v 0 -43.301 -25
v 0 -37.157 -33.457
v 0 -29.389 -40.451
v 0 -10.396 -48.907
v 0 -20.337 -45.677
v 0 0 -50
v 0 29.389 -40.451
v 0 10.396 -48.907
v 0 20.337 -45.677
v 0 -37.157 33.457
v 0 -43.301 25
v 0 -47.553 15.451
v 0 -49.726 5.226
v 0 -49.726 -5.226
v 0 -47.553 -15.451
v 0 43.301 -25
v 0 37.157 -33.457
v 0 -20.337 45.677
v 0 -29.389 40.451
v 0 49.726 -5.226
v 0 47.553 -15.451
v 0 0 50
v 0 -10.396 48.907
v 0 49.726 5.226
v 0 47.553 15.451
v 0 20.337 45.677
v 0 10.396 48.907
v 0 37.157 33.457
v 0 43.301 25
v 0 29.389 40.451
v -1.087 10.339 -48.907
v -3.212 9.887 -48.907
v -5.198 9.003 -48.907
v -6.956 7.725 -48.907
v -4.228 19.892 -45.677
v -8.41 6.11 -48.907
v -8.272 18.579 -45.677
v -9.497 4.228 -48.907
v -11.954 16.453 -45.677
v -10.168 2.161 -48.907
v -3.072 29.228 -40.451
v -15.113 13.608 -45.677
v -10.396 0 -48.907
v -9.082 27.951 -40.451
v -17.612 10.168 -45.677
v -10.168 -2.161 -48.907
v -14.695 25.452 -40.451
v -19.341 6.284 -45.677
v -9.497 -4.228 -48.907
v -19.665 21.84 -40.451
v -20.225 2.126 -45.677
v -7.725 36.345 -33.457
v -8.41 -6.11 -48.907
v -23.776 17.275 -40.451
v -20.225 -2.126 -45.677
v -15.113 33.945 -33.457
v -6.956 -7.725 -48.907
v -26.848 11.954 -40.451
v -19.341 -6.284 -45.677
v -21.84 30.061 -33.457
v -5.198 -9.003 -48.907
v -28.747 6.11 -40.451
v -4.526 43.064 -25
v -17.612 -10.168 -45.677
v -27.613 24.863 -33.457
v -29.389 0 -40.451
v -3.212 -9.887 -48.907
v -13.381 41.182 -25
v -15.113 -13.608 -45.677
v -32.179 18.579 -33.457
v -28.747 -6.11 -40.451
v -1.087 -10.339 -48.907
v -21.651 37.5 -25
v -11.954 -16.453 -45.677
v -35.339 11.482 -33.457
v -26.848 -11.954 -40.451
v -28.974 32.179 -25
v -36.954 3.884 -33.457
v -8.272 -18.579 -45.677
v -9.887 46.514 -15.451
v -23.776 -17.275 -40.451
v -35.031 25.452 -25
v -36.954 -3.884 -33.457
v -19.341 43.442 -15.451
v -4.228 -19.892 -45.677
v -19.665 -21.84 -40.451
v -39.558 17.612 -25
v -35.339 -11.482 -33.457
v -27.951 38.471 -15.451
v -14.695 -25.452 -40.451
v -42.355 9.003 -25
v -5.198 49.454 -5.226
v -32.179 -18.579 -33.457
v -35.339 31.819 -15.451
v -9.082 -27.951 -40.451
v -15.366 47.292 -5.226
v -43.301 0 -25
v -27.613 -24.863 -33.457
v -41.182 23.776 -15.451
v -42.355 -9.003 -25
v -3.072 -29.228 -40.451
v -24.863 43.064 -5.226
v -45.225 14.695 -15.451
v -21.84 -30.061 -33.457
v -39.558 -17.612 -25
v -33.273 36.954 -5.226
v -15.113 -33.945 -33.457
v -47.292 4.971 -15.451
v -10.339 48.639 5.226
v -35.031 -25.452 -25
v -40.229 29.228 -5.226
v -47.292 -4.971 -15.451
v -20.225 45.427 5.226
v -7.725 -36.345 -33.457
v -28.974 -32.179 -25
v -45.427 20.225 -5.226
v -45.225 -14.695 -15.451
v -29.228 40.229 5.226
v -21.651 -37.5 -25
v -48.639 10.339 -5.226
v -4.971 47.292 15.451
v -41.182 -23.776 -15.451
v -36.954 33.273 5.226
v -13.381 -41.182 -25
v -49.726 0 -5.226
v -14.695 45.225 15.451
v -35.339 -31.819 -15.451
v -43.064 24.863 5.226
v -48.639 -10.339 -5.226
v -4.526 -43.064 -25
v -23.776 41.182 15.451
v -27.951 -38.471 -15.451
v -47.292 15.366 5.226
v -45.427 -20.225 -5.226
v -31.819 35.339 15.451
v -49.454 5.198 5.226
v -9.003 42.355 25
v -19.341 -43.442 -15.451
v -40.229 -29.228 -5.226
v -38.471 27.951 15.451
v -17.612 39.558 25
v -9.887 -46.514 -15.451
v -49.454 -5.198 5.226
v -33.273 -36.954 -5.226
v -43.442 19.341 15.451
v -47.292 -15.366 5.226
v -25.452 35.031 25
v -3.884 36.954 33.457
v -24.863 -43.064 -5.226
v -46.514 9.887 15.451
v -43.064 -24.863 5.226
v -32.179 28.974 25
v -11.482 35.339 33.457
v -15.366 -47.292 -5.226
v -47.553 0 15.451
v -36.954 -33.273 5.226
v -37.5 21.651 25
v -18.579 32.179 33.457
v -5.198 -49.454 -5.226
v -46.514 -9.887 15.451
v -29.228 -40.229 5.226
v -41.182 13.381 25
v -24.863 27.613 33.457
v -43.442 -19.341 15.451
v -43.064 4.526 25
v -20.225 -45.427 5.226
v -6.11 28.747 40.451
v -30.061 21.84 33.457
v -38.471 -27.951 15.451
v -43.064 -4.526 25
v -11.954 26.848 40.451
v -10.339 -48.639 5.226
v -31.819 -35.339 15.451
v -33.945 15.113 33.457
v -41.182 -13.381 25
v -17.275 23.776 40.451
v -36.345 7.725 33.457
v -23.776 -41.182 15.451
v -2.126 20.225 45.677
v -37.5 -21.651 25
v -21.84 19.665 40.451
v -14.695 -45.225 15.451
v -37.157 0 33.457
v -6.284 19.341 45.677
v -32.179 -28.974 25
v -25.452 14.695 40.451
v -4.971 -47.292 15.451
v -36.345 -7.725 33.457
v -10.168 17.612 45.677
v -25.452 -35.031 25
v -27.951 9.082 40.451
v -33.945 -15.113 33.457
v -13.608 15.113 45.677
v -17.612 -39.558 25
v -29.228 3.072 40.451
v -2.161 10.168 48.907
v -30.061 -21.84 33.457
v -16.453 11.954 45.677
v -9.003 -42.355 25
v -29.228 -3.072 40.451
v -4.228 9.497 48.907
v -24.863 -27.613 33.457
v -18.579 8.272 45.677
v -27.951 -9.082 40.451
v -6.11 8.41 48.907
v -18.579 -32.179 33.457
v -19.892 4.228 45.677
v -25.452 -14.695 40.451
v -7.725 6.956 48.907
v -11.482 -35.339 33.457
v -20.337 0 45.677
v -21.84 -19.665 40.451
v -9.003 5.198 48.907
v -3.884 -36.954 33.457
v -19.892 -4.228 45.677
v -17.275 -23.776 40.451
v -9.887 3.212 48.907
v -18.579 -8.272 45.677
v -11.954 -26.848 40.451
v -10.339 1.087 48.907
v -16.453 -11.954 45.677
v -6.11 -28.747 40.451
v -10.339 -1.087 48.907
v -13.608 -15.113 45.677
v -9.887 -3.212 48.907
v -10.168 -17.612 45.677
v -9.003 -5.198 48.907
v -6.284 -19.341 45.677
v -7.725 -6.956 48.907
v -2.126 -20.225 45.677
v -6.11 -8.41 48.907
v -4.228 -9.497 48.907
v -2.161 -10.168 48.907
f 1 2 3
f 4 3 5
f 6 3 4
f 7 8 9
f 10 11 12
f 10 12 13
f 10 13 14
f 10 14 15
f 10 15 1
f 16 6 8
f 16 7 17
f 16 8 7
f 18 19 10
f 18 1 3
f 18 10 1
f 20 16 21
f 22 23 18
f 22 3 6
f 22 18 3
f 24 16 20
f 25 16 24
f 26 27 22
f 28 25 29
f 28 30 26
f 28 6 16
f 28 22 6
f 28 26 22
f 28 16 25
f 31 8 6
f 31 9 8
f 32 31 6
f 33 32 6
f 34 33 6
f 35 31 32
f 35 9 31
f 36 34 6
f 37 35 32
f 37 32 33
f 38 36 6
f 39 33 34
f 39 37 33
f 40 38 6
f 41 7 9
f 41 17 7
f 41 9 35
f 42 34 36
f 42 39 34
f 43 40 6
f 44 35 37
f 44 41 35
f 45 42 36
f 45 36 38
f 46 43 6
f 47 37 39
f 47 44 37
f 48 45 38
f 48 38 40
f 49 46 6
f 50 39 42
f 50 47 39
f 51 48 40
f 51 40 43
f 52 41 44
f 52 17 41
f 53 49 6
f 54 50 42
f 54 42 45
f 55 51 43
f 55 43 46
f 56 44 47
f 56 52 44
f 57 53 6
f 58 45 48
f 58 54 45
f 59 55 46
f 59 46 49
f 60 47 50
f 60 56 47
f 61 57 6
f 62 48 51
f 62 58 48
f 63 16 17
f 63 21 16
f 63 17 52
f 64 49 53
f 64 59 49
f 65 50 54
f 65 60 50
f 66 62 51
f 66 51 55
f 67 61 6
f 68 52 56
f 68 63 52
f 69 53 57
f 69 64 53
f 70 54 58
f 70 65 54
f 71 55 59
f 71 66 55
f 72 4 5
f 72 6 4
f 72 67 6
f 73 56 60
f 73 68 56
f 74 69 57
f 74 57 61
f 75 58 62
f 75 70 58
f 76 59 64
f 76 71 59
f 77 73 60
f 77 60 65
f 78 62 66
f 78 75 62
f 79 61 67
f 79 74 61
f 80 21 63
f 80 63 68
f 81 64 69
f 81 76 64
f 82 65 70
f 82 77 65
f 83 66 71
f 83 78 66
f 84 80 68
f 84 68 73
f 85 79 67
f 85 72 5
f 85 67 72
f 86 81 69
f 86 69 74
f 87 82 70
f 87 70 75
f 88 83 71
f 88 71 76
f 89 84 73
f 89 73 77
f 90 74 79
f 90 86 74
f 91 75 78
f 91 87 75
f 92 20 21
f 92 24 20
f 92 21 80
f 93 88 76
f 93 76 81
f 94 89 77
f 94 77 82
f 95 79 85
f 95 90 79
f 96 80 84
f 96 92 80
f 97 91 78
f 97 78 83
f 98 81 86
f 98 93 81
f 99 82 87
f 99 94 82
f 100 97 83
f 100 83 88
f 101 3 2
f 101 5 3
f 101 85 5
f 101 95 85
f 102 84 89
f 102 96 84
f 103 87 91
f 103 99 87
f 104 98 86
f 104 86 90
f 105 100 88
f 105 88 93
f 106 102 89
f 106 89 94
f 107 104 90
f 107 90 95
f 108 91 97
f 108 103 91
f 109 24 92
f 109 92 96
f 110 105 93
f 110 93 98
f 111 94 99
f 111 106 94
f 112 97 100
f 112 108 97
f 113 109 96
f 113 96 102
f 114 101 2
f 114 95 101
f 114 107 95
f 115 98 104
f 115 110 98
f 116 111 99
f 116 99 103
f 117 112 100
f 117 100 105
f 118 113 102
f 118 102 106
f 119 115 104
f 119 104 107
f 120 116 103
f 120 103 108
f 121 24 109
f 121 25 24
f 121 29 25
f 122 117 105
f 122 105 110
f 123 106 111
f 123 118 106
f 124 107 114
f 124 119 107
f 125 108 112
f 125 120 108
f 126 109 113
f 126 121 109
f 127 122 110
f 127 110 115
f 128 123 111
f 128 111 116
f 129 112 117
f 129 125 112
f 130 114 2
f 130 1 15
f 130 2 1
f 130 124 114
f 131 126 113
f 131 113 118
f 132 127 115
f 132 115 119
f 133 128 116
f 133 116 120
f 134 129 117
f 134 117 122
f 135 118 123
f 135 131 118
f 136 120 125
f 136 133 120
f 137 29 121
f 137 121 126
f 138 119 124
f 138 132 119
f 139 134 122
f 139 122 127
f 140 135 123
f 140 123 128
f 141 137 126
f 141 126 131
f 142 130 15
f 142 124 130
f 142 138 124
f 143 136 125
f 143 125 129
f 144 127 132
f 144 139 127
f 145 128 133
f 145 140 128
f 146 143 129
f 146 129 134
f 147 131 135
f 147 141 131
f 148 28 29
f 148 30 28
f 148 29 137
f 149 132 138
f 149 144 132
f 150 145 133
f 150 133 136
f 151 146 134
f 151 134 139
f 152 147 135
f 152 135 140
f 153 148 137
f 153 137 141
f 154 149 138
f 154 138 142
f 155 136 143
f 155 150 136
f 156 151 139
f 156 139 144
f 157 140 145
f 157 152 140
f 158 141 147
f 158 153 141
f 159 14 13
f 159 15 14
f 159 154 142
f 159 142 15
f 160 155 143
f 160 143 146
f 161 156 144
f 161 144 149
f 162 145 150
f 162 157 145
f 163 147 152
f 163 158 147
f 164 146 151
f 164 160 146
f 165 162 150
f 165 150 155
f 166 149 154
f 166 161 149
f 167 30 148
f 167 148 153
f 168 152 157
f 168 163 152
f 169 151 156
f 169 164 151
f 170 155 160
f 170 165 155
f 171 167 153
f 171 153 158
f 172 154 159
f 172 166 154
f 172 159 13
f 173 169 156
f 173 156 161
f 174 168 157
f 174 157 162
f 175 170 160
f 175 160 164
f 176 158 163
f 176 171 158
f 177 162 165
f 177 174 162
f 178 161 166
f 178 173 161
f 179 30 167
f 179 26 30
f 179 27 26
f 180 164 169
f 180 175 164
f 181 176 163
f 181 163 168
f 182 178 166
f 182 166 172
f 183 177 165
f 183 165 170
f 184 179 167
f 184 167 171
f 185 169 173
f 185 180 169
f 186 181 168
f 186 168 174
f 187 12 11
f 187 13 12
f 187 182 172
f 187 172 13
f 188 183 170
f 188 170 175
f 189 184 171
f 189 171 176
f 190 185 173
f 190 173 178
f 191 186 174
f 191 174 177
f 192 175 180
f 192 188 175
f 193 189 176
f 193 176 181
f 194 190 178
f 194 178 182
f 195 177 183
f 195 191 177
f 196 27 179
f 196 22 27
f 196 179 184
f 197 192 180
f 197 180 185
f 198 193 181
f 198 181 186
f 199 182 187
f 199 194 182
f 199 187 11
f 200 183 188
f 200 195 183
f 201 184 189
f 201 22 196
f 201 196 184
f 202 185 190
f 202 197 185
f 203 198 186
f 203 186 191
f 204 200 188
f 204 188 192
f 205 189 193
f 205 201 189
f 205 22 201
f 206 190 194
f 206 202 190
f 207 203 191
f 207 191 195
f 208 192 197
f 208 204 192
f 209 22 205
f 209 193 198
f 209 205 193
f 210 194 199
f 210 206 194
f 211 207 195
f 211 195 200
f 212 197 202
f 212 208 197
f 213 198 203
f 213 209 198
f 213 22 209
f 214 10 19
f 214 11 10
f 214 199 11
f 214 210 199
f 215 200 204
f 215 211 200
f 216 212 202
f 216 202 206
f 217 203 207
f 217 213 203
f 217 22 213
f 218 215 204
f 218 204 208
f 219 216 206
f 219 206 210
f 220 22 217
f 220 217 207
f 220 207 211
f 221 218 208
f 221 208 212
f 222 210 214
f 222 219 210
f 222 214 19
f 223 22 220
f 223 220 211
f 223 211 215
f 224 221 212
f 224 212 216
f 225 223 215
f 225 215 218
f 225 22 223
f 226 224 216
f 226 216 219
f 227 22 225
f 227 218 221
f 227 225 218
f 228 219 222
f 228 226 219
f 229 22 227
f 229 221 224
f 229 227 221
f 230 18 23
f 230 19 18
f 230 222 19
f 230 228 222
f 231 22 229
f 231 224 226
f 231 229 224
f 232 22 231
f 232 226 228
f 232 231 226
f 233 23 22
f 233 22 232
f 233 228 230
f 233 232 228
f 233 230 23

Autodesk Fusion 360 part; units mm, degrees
sketch "Sketch1" plane through (0, 0, 0) normal (0, 0, 1) x (1, 0, 0)
sphere "SpherePrimitive1" add diameter 100 placed x (1, 0, 0) y (0, 1, 0) z (0, 0, 1) at (0, 0, 0)
sketch "Sketch2" plane through (0, 0, 0) normal (1, 0, 0) x (0, 1, 0)
  line L0 (75, 50) -> (-75, 50)
  line L1 (-75, 50) -> (-75, -50)
  line L2 (-75, -50) -> (75, -50)
  line L3 (75, -50) -> (75, 50)
extrude "Extrude1" cut sketch "Sketch2" along normal blind 50
shell "Shell1" thickness 10 removed faces 1 at (0, -9.8252, -7.4174)
